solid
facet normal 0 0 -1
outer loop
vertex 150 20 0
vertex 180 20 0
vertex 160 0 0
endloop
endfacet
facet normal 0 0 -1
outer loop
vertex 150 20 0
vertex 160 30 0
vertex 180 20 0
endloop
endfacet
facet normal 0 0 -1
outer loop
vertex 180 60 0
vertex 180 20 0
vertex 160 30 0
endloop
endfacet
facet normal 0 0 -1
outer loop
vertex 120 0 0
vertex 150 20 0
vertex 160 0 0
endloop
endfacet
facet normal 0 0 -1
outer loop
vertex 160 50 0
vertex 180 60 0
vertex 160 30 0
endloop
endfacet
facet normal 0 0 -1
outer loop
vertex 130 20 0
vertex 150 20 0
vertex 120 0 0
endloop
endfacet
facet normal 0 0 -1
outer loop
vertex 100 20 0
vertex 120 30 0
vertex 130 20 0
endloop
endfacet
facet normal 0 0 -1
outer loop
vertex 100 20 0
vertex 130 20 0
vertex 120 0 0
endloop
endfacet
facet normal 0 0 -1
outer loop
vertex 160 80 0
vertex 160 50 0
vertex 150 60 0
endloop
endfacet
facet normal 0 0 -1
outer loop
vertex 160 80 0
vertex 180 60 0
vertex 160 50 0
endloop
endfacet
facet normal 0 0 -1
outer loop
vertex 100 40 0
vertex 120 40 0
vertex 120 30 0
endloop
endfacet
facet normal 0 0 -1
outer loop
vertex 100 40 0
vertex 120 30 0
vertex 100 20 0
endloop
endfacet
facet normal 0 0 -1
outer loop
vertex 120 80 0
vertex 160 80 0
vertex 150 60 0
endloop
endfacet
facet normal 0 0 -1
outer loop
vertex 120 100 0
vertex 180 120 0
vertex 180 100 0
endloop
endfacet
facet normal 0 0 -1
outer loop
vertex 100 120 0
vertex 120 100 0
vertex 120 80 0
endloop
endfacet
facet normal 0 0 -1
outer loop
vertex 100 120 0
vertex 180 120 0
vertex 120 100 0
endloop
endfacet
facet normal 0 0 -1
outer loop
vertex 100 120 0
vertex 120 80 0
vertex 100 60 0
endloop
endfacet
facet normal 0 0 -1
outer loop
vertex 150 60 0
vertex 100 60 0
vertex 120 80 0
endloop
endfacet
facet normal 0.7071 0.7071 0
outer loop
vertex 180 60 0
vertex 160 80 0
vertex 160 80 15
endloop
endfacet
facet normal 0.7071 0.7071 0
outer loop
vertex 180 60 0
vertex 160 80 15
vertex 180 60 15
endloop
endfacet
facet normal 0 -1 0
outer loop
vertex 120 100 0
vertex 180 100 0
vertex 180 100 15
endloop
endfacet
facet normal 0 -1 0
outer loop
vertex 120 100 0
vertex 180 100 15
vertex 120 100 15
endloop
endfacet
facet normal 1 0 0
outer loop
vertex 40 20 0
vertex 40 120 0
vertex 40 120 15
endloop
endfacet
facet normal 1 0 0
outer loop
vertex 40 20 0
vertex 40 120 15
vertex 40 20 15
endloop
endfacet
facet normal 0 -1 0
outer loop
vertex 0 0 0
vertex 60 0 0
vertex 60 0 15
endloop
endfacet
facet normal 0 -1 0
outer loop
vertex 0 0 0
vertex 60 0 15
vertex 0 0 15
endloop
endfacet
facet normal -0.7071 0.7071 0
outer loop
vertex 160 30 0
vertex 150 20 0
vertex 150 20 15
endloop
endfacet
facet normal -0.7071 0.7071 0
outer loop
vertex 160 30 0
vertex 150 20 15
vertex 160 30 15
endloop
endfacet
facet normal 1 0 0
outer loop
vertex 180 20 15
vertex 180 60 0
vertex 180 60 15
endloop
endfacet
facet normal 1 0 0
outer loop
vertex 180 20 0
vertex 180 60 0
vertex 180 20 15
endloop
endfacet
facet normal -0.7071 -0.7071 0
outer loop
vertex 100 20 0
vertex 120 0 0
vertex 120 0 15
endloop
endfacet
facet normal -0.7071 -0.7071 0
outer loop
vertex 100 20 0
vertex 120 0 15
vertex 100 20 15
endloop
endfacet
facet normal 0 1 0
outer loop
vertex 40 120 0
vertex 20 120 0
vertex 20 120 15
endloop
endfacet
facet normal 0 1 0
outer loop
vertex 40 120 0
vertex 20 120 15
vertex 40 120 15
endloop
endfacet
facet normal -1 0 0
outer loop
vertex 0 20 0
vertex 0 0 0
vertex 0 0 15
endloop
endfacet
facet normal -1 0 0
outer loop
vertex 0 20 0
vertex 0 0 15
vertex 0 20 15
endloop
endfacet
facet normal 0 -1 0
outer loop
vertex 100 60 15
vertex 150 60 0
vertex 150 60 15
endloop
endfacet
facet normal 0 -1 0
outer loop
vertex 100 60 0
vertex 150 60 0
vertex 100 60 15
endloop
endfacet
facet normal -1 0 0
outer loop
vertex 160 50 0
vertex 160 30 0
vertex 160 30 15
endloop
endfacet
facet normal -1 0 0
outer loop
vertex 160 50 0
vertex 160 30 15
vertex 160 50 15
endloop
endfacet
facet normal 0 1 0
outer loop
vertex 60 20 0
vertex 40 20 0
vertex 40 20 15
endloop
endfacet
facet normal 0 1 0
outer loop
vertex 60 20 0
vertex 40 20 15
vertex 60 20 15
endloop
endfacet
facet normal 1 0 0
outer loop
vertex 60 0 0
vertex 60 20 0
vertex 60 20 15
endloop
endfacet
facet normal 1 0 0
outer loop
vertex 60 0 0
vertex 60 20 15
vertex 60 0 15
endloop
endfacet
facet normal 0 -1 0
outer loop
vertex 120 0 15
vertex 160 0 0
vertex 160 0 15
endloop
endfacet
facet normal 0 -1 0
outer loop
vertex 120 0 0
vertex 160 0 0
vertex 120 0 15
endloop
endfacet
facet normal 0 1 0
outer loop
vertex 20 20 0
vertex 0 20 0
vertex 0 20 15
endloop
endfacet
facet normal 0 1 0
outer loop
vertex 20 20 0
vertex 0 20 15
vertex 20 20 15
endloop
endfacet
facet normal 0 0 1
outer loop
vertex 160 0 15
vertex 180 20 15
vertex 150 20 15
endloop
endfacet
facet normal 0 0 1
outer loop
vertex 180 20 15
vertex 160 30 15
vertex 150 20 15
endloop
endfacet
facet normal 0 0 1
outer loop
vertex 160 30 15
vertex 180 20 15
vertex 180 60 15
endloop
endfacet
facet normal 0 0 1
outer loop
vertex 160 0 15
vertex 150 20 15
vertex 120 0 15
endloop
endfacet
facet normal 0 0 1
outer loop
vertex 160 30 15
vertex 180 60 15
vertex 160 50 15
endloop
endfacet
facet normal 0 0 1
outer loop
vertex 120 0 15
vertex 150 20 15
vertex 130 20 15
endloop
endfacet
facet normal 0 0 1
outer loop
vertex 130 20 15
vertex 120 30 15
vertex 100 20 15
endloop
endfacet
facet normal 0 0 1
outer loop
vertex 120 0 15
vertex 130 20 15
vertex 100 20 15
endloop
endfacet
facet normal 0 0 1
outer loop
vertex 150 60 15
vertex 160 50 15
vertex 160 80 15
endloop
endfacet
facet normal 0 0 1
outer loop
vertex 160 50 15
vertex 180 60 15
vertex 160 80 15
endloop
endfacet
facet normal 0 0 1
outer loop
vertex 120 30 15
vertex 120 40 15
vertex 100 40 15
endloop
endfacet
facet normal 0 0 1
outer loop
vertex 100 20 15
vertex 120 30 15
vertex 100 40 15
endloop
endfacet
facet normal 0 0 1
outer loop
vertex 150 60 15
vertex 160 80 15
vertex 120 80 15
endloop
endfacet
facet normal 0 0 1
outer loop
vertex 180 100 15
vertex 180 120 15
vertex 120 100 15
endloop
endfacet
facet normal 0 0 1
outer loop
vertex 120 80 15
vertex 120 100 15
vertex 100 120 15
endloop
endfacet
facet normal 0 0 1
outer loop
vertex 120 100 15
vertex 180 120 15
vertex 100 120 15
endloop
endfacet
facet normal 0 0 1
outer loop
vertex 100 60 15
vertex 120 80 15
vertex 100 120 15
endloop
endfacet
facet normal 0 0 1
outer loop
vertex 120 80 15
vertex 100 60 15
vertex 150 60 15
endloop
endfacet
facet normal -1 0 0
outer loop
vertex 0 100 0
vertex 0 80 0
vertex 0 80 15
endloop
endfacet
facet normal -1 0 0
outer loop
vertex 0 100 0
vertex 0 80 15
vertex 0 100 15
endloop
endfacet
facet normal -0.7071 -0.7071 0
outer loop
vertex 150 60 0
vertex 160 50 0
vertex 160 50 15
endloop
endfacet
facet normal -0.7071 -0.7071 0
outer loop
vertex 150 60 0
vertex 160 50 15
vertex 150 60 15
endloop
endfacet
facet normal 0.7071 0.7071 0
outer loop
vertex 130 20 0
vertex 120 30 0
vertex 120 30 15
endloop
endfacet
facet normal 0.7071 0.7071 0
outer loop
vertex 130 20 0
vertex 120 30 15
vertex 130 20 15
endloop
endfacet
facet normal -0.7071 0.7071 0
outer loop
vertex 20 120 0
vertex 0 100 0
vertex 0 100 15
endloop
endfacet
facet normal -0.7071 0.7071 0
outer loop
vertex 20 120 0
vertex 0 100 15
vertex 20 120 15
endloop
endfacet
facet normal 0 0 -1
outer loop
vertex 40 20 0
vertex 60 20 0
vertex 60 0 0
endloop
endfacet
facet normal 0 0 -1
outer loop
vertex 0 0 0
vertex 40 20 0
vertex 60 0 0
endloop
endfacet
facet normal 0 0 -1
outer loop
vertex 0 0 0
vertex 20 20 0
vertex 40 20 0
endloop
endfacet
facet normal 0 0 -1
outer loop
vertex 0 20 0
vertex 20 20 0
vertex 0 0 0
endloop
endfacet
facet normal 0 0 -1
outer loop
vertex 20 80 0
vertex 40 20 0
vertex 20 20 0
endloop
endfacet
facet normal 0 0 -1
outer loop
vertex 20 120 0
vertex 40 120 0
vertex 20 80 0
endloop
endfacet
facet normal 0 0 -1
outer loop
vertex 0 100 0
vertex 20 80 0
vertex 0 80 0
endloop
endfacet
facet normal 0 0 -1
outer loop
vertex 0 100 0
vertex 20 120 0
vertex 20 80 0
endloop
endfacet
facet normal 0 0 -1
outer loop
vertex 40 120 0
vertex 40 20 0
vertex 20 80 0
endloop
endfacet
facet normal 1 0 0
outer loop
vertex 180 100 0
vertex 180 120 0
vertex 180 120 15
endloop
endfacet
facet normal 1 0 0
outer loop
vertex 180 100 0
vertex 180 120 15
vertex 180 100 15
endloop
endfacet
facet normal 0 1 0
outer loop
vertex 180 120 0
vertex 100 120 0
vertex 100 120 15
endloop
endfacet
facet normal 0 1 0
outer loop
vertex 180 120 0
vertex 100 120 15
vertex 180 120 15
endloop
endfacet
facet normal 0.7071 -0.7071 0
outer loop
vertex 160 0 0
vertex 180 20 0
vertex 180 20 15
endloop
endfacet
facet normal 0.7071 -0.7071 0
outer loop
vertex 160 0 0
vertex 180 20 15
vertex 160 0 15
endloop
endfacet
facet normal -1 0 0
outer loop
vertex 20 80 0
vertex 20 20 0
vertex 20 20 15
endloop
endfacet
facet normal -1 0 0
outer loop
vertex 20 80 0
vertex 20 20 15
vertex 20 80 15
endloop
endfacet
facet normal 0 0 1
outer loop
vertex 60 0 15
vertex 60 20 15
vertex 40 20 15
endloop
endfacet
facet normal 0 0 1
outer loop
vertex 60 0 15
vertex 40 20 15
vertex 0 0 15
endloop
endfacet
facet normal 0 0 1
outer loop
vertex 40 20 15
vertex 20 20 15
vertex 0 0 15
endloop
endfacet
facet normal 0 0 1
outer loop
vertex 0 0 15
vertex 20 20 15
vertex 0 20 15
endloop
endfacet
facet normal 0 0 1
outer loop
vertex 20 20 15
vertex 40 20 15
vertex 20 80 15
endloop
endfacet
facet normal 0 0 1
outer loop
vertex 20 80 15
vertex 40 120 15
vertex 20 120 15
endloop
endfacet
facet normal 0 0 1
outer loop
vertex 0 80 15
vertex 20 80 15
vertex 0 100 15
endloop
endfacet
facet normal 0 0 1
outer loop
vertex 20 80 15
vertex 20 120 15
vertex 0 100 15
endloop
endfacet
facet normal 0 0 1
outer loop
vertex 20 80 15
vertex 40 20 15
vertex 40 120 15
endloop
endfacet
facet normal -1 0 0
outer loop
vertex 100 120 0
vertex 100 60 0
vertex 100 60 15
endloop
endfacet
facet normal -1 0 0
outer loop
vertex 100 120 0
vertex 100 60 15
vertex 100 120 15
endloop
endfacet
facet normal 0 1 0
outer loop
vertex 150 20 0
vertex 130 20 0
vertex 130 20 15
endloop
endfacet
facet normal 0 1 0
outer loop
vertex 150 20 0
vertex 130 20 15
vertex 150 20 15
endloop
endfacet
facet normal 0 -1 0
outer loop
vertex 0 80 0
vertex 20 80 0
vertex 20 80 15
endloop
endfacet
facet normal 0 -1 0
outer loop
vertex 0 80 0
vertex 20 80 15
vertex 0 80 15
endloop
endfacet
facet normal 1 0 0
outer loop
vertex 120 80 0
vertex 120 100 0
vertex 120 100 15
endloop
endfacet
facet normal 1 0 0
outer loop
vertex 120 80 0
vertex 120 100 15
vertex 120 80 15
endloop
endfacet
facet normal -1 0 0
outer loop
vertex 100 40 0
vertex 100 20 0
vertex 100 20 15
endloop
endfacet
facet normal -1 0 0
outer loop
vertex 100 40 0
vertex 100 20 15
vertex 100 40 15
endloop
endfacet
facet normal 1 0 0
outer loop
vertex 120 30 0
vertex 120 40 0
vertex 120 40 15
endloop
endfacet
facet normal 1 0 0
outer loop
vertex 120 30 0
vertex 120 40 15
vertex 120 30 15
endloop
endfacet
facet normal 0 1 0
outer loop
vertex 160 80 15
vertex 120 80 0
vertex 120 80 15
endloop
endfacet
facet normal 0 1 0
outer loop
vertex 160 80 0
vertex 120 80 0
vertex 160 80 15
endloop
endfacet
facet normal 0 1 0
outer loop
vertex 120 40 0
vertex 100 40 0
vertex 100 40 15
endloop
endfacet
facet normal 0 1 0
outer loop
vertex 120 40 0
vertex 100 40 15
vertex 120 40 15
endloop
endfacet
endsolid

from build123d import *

# Parameters (mm, degrees)
EXTRUDE1_DEPTH   = 15
EXTRUDE1_2_DEPTH = 15


with BuildPart() as part:
    # Sketch1 → Extrude1 (new body)
    with BuildSketch(Plane.XY):
        Polygon((20, 120), (40, 120), (40, 20), (60, 20), (60, 0), (0, 0), (0, 20), (20, 20), (20, 80), (0, 80), (0, 100), align=None)
    extrude(amount=EXTRUDE1_DEPTH)


with BuildPart() as body_2:
    # Sketch1 → Extrude1 2 (new body)
    with BuildSketch(Plane.XY):
        Polygon((100, 120), (180, 120), (180, 100), (120, 100), (120, 80), (160, 80), (180, 60), (180, 20), (160, 0), (120, 0), (100, 20), (100, 40), (120, 40), (120, 30), (130, 20), (150, 20), (160, 30), (160, 50), (150, 60), (100, 60), align=None)
    extrude(amount=EXTRUDE1_2_DEPTH)


solid = Compound([part.part, body_2.part])
